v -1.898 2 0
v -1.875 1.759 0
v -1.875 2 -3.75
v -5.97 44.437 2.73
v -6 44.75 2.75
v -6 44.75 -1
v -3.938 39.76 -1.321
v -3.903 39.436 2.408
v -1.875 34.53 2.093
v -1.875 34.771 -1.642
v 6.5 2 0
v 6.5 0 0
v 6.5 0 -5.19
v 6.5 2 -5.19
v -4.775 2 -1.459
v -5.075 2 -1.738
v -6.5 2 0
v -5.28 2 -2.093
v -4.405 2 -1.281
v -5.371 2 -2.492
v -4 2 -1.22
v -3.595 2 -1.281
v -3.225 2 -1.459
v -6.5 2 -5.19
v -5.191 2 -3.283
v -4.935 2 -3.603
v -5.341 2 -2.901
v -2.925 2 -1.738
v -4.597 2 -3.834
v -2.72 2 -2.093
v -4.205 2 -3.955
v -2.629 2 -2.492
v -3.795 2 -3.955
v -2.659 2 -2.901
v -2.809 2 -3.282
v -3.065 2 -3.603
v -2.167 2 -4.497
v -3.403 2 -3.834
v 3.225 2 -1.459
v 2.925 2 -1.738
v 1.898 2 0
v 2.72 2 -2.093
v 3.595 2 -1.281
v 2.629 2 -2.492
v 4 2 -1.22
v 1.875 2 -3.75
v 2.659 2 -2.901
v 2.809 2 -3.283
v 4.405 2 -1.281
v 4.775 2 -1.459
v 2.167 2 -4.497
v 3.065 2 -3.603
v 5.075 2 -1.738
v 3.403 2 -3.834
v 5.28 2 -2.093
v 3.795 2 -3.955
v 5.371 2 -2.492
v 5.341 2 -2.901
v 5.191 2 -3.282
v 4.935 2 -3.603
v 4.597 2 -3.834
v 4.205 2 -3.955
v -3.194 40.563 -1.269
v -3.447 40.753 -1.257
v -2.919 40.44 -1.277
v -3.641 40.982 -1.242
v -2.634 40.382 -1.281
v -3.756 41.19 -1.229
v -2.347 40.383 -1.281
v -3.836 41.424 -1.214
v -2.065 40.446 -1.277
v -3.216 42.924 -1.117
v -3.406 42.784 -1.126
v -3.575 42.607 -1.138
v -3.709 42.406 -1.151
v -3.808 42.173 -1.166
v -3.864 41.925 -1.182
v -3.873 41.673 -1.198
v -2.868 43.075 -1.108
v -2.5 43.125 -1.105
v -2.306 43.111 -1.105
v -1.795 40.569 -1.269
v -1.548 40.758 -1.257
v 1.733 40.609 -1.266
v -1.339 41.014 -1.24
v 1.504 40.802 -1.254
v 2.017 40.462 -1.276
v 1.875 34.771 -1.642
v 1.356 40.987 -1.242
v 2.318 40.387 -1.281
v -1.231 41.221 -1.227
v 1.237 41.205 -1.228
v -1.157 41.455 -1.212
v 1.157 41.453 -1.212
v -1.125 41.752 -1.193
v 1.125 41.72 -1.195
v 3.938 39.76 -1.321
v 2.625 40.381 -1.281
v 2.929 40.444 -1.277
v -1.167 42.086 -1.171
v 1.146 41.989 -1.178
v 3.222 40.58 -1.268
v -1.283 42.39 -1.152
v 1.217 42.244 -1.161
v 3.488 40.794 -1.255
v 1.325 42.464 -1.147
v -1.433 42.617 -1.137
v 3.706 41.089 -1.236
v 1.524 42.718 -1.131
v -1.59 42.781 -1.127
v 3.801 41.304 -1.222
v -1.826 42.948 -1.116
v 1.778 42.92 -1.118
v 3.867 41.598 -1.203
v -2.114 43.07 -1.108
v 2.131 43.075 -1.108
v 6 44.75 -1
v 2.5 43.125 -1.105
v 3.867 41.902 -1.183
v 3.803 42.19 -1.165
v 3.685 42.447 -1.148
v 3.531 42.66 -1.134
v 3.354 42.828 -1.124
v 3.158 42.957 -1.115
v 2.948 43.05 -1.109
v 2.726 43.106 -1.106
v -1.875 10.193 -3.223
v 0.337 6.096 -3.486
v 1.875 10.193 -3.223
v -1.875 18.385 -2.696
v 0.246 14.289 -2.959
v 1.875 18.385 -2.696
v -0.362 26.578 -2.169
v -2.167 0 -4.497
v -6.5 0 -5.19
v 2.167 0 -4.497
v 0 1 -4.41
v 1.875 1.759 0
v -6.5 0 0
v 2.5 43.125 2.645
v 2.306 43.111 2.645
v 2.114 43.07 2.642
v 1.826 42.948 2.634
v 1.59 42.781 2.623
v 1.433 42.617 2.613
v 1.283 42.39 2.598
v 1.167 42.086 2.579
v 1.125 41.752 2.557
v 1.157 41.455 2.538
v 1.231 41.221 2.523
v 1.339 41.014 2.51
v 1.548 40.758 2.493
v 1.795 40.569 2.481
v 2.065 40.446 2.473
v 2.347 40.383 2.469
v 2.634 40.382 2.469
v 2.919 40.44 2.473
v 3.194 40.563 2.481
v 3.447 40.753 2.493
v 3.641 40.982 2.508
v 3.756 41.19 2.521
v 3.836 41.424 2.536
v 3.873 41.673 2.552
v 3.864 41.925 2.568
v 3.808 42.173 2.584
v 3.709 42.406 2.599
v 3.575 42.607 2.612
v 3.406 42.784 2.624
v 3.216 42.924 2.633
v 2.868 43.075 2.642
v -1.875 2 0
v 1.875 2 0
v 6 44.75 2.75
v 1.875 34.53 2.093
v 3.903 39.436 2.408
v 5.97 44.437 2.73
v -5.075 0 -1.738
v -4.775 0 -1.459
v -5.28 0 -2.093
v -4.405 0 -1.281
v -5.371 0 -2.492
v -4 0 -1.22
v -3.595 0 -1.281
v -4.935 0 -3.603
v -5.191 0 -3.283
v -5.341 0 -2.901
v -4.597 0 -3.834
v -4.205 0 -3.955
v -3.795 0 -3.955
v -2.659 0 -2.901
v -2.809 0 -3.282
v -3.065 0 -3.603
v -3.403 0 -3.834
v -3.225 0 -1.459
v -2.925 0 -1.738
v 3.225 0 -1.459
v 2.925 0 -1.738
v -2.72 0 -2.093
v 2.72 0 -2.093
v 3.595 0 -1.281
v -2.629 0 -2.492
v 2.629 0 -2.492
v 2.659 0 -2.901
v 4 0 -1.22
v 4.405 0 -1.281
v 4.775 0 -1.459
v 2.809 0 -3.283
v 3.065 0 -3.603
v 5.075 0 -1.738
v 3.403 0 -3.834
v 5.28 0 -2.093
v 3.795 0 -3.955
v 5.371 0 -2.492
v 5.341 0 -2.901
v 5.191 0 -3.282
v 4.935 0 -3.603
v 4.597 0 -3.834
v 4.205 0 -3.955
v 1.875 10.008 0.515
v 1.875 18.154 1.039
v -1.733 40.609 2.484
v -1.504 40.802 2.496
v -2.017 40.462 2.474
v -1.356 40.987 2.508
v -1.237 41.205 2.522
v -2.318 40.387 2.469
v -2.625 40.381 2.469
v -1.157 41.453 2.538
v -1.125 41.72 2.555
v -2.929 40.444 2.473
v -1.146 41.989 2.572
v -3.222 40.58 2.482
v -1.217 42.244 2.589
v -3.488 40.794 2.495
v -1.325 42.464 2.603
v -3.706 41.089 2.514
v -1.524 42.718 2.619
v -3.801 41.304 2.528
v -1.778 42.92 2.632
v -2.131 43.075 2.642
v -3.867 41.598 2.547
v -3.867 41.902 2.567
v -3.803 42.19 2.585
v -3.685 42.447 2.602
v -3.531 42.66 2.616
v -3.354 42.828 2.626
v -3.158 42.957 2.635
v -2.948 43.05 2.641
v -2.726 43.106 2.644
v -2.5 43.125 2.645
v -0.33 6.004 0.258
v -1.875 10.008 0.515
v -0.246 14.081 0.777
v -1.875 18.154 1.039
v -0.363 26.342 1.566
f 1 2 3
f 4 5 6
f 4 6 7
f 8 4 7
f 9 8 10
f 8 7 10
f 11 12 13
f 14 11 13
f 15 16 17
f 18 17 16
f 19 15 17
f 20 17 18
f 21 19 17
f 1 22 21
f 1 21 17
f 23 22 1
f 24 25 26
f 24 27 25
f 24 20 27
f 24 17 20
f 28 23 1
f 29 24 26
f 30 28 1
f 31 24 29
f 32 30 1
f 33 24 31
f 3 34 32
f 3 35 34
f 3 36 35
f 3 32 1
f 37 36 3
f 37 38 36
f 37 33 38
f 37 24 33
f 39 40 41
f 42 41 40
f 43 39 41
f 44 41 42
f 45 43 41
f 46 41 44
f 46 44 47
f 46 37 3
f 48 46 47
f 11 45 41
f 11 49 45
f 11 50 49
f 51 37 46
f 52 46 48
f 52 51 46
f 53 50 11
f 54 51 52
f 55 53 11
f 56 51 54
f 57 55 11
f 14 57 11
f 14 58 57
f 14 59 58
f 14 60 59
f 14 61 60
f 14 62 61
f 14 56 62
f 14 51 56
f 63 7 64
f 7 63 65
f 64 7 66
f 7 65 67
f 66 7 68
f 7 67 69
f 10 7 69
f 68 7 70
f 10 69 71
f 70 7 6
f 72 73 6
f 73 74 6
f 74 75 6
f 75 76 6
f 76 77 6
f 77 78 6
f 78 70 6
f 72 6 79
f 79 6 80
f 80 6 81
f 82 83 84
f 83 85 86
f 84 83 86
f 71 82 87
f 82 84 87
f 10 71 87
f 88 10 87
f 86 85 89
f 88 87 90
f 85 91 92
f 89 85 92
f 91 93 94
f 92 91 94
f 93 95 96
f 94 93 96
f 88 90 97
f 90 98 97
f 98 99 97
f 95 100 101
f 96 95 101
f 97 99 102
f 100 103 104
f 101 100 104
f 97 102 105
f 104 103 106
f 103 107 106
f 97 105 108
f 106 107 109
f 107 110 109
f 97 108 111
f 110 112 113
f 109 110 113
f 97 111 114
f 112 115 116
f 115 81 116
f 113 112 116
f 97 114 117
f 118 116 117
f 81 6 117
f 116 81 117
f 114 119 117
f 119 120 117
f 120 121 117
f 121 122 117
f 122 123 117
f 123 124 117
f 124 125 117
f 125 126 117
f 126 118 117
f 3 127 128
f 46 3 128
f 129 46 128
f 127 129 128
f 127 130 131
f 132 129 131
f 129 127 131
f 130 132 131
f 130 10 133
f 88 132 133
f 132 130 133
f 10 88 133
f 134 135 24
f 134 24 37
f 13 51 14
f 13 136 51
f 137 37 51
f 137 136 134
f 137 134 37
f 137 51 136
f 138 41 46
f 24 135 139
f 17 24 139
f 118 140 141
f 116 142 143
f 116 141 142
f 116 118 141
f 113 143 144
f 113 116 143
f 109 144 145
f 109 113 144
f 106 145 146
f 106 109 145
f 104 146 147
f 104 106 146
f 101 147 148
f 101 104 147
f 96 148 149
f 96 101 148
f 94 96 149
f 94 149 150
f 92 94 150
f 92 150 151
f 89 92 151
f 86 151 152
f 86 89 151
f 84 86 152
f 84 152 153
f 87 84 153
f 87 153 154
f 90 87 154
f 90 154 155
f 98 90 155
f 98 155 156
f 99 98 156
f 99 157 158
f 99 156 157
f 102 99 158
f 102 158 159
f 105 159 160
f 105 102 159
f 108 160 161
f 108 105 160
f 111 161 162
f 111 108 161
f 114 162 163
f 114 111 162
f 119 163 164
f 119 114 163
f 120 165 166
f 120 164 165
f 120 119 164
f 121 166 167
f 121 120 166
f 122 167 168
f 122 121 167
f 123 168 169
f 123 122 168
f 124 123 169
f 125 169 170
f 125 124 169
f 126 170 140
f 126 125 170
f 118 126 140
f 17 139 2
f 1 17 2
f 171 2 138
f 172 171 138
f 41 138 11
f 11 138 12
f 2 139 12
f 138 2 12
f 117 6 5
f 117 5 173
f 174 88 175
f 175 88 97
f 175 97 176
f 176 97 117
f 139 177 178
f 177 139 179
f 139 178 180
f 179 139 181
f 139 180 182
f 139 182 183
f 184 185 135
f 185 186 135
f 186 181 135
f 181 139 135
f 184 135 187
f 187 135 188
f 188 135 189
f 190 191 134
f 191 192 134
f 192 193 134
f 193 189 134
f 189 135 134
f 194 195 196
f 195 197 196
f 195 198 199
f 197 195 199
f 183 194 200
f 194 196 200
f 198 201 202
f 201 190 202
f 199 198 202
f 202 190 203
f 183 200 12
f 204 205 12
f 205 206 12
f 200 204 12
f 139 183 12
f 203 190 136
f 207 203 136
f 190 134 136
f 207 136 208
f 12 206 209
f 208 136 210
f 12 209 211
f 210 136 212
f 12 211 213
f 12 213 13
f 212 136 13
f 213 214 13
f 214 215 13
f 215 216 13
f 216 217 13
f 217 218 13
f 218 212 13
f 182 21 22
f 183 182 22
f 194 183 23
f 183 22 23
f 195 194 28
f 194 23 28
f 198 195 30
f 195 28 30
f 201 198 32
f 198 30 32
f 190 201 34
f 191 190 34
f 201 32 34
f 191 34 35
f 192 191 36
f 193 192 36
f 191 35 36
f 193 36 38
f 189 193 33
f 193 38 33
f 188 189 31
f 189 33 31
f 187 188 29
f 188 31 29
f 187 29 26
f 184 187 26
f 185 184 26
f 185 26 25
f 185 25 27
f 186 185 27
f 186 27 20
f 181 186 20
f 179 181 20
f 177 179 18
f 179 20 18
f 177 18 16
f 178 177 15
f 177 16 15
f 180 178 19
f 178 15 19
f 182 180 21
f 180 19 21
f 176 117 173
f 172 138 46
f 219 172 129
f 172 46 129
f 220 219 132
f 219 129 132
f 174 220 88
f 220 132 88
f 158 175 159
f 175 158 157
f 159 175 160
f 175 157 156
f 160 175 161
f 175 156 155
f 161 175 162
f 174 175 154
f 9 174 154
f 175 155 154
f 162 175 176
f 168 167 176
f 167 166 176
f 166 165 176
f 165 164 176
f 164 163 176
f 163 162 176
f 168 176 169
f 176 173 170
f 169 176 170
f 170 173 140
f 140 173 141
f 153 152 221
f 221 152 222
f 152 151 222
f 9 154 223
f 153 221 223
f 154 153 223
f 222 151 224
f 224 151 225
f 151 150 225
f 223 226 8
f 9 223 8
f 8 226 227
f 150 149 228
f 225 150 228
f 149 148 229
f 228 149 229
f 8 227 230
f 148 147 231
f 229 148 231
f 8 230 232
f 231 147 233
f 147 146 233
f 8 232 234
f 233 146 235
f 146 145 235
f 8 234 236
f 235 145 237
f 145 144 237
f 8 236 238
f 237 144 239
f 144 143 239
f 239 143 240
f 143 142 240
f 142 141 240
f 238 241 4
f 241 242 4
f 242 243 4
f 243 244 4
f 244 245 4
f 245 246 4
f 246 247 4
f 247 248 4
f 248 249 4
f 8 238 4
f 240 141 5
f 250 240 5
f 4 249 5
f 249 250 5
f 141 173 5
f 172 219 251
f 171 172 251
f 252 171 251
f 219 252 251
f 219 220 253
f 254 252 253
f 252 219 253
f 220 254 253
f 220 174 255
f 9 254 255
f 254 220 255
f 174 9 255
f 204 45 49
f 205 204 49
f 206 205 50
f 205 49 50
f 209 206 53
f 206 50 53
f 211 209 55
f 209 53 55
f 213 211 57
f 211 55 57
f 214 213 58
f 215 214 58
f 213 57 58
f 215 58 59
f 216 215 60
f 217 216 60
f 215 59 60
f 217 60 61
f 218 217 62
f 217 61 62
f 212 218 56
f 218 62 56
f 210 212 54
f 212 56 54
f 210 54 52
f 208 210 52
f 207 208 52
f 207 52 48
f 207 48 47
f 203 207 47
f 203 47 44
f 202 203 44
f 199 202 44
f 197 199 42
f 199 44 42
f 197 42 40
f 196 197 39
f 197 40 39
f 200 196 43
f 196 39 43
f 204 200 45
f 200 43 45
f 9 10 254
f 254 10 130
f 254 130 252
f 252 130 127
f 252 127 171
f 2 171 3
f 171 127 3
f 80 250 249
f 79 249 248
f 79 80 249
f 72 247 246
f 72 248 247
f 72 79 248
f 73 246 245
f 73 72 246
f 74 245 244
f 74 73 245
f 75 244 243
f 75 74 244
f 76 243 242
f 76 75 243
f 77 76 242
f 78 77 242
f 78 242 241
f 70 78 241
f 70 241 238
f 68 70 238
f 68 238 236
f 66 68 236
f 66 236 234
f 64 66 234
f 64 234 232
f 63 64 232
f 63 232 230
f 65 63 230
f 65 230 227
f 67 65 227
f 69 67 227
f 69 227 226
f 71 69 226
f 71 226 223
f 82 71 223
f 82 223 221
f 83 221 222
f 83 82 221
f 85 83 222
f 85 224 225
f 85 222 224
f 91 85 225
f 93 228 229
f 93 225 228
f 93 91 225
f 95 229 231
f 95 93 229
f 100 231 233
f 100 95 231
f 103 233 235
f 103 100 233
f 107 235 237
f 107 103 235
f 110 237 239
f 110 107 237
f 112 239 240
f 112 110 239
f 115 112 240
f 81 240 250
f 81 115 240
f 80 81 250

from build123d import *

# Parameters (mm, degrees)
BOSS_EXTRUDE1_DEPTH     = 2
SKETCH2_R               = 1.375
CUT_EXTRUDE1_DEPTH      = 2
CUT_EXTRUDE5_DEPTH      = 10
CUT_EXTRUDE3_DEPTH      = 46.516465277
CUT_EXTRUDE3_DEPTH_BACK = 46.516465277
SKETCH12_R              = 1.375


with BuildPart() as part:
    # Sketch1 → Boss-Extrude1 (new body)
    with BuildSketch(Plane(origin=(0, 0, 0), x_dir=(1, 0, 0), z_dir=(0, 1, 0))):
        with BuildLine():
            Line((-6.5, 0), (6.5, 0))
            Line((6.5, 0), (6.5, 5.19))
            add(Edge.make_bspline(
                [(-6.5, 5.19), (0, 3.63), (6.5, 5.19)],
                knots=[0, 0, 0, 1, 1, 1], degree=2))
            Line((-6.5, 5.19), (-6.5, 0))
        make_face()
    extrude(amount=BOSS_EXTRUDE1_DEPTH)

    # Sketch2 → Cut-Extrude1 (cut)
    with BuildSketch(Plane(origin=(0, 2, 0), x_dir=(1, 0, 0), z_dir=(0, 1, 0))):
        with Locations(Location((-4, 2.595, 0), (0, 0, 270))):
            Circle(SKETCH2_R)
        with Locations(Location((4, 2.595, 0), (0, 0, 270))):
            Circle(SKETCH2_R)
    extrude(amount=-CUT_EXTRUDE1_DEPTH, mode=Mode.SUBTRACT)

    # Sketch4 → Loft2 section 0
    with BuildSketch(Plane(origin=(0, 2, 0), x_dir=(1, 0, 0), z_dir=(0, 1, 0))):
        with BuildLine():
            Line((-1.875, 3.75), (1.875, 3.75))
            Line((1.875, 3.75), (1.875, 0))
            Line((1.875, 0), (-1.875, 0))
            Line((-1.875, 0), (-1.875, 3.75))
        make_face()
    # Sketch6 → Loft2 section 1
    with BuildSketch(Plane(origin=(0, 44.75, 0), x_dir=(1, 0, 0), z_dir=(0, 1, 0))):
        with BuildLine():
            Line((-6, 1), (6, 1))
            Line((6, 1), (6, -2.75))
            Line((6, -2.75), (-6, -2.75))
            Line((-6, -2.75), (-6, 1))
        make_face()
    loft()

    # Sketch16 → Cut-Extrude5 (cut)
    with BuildSketch(Plane(origin=(0, 0.248475921, -3.86267114), x_dir=(-1, 0, 0), z_dir=(0, 0.06419480263840949, -0.9979373864698206))):
        Polygon((-1.875, 1.755144263), (-1.875, 34.593503242), (-6, 44.593503242), align=None)
        Polygon((1.875, 34.593503242), (1.875, 1.755144263), (6, 44.593503242), align=None)
    extrude(amount=-CUT_EXTRUDE5_DEPTH, mode=Mode.SUBTRACT)

    # Sketch12 → Cut-Extrude3 (cut, two sides: drawn at the far end of the back side and taken through both)
    with BuildSketch(Plane.XY.offset(-CUT_EXTRUDE3_DEPTH_BACK)):
        with Locations(Location((-2.5, 41.75, 0), (0, 0, 90))):
            Circle(SKETCH12_R)
        with Locations(Location((2.5, 41.75, 0), (0, 0, 90))):
            Circle(SKETCH12_R)
    extrude(amount=CUT_EXTRUDE3_DEPTH + CUT_EXTRUDE3_DEPTH_BACK, mode=Mode.SUBTRACT)


solid = part.part
